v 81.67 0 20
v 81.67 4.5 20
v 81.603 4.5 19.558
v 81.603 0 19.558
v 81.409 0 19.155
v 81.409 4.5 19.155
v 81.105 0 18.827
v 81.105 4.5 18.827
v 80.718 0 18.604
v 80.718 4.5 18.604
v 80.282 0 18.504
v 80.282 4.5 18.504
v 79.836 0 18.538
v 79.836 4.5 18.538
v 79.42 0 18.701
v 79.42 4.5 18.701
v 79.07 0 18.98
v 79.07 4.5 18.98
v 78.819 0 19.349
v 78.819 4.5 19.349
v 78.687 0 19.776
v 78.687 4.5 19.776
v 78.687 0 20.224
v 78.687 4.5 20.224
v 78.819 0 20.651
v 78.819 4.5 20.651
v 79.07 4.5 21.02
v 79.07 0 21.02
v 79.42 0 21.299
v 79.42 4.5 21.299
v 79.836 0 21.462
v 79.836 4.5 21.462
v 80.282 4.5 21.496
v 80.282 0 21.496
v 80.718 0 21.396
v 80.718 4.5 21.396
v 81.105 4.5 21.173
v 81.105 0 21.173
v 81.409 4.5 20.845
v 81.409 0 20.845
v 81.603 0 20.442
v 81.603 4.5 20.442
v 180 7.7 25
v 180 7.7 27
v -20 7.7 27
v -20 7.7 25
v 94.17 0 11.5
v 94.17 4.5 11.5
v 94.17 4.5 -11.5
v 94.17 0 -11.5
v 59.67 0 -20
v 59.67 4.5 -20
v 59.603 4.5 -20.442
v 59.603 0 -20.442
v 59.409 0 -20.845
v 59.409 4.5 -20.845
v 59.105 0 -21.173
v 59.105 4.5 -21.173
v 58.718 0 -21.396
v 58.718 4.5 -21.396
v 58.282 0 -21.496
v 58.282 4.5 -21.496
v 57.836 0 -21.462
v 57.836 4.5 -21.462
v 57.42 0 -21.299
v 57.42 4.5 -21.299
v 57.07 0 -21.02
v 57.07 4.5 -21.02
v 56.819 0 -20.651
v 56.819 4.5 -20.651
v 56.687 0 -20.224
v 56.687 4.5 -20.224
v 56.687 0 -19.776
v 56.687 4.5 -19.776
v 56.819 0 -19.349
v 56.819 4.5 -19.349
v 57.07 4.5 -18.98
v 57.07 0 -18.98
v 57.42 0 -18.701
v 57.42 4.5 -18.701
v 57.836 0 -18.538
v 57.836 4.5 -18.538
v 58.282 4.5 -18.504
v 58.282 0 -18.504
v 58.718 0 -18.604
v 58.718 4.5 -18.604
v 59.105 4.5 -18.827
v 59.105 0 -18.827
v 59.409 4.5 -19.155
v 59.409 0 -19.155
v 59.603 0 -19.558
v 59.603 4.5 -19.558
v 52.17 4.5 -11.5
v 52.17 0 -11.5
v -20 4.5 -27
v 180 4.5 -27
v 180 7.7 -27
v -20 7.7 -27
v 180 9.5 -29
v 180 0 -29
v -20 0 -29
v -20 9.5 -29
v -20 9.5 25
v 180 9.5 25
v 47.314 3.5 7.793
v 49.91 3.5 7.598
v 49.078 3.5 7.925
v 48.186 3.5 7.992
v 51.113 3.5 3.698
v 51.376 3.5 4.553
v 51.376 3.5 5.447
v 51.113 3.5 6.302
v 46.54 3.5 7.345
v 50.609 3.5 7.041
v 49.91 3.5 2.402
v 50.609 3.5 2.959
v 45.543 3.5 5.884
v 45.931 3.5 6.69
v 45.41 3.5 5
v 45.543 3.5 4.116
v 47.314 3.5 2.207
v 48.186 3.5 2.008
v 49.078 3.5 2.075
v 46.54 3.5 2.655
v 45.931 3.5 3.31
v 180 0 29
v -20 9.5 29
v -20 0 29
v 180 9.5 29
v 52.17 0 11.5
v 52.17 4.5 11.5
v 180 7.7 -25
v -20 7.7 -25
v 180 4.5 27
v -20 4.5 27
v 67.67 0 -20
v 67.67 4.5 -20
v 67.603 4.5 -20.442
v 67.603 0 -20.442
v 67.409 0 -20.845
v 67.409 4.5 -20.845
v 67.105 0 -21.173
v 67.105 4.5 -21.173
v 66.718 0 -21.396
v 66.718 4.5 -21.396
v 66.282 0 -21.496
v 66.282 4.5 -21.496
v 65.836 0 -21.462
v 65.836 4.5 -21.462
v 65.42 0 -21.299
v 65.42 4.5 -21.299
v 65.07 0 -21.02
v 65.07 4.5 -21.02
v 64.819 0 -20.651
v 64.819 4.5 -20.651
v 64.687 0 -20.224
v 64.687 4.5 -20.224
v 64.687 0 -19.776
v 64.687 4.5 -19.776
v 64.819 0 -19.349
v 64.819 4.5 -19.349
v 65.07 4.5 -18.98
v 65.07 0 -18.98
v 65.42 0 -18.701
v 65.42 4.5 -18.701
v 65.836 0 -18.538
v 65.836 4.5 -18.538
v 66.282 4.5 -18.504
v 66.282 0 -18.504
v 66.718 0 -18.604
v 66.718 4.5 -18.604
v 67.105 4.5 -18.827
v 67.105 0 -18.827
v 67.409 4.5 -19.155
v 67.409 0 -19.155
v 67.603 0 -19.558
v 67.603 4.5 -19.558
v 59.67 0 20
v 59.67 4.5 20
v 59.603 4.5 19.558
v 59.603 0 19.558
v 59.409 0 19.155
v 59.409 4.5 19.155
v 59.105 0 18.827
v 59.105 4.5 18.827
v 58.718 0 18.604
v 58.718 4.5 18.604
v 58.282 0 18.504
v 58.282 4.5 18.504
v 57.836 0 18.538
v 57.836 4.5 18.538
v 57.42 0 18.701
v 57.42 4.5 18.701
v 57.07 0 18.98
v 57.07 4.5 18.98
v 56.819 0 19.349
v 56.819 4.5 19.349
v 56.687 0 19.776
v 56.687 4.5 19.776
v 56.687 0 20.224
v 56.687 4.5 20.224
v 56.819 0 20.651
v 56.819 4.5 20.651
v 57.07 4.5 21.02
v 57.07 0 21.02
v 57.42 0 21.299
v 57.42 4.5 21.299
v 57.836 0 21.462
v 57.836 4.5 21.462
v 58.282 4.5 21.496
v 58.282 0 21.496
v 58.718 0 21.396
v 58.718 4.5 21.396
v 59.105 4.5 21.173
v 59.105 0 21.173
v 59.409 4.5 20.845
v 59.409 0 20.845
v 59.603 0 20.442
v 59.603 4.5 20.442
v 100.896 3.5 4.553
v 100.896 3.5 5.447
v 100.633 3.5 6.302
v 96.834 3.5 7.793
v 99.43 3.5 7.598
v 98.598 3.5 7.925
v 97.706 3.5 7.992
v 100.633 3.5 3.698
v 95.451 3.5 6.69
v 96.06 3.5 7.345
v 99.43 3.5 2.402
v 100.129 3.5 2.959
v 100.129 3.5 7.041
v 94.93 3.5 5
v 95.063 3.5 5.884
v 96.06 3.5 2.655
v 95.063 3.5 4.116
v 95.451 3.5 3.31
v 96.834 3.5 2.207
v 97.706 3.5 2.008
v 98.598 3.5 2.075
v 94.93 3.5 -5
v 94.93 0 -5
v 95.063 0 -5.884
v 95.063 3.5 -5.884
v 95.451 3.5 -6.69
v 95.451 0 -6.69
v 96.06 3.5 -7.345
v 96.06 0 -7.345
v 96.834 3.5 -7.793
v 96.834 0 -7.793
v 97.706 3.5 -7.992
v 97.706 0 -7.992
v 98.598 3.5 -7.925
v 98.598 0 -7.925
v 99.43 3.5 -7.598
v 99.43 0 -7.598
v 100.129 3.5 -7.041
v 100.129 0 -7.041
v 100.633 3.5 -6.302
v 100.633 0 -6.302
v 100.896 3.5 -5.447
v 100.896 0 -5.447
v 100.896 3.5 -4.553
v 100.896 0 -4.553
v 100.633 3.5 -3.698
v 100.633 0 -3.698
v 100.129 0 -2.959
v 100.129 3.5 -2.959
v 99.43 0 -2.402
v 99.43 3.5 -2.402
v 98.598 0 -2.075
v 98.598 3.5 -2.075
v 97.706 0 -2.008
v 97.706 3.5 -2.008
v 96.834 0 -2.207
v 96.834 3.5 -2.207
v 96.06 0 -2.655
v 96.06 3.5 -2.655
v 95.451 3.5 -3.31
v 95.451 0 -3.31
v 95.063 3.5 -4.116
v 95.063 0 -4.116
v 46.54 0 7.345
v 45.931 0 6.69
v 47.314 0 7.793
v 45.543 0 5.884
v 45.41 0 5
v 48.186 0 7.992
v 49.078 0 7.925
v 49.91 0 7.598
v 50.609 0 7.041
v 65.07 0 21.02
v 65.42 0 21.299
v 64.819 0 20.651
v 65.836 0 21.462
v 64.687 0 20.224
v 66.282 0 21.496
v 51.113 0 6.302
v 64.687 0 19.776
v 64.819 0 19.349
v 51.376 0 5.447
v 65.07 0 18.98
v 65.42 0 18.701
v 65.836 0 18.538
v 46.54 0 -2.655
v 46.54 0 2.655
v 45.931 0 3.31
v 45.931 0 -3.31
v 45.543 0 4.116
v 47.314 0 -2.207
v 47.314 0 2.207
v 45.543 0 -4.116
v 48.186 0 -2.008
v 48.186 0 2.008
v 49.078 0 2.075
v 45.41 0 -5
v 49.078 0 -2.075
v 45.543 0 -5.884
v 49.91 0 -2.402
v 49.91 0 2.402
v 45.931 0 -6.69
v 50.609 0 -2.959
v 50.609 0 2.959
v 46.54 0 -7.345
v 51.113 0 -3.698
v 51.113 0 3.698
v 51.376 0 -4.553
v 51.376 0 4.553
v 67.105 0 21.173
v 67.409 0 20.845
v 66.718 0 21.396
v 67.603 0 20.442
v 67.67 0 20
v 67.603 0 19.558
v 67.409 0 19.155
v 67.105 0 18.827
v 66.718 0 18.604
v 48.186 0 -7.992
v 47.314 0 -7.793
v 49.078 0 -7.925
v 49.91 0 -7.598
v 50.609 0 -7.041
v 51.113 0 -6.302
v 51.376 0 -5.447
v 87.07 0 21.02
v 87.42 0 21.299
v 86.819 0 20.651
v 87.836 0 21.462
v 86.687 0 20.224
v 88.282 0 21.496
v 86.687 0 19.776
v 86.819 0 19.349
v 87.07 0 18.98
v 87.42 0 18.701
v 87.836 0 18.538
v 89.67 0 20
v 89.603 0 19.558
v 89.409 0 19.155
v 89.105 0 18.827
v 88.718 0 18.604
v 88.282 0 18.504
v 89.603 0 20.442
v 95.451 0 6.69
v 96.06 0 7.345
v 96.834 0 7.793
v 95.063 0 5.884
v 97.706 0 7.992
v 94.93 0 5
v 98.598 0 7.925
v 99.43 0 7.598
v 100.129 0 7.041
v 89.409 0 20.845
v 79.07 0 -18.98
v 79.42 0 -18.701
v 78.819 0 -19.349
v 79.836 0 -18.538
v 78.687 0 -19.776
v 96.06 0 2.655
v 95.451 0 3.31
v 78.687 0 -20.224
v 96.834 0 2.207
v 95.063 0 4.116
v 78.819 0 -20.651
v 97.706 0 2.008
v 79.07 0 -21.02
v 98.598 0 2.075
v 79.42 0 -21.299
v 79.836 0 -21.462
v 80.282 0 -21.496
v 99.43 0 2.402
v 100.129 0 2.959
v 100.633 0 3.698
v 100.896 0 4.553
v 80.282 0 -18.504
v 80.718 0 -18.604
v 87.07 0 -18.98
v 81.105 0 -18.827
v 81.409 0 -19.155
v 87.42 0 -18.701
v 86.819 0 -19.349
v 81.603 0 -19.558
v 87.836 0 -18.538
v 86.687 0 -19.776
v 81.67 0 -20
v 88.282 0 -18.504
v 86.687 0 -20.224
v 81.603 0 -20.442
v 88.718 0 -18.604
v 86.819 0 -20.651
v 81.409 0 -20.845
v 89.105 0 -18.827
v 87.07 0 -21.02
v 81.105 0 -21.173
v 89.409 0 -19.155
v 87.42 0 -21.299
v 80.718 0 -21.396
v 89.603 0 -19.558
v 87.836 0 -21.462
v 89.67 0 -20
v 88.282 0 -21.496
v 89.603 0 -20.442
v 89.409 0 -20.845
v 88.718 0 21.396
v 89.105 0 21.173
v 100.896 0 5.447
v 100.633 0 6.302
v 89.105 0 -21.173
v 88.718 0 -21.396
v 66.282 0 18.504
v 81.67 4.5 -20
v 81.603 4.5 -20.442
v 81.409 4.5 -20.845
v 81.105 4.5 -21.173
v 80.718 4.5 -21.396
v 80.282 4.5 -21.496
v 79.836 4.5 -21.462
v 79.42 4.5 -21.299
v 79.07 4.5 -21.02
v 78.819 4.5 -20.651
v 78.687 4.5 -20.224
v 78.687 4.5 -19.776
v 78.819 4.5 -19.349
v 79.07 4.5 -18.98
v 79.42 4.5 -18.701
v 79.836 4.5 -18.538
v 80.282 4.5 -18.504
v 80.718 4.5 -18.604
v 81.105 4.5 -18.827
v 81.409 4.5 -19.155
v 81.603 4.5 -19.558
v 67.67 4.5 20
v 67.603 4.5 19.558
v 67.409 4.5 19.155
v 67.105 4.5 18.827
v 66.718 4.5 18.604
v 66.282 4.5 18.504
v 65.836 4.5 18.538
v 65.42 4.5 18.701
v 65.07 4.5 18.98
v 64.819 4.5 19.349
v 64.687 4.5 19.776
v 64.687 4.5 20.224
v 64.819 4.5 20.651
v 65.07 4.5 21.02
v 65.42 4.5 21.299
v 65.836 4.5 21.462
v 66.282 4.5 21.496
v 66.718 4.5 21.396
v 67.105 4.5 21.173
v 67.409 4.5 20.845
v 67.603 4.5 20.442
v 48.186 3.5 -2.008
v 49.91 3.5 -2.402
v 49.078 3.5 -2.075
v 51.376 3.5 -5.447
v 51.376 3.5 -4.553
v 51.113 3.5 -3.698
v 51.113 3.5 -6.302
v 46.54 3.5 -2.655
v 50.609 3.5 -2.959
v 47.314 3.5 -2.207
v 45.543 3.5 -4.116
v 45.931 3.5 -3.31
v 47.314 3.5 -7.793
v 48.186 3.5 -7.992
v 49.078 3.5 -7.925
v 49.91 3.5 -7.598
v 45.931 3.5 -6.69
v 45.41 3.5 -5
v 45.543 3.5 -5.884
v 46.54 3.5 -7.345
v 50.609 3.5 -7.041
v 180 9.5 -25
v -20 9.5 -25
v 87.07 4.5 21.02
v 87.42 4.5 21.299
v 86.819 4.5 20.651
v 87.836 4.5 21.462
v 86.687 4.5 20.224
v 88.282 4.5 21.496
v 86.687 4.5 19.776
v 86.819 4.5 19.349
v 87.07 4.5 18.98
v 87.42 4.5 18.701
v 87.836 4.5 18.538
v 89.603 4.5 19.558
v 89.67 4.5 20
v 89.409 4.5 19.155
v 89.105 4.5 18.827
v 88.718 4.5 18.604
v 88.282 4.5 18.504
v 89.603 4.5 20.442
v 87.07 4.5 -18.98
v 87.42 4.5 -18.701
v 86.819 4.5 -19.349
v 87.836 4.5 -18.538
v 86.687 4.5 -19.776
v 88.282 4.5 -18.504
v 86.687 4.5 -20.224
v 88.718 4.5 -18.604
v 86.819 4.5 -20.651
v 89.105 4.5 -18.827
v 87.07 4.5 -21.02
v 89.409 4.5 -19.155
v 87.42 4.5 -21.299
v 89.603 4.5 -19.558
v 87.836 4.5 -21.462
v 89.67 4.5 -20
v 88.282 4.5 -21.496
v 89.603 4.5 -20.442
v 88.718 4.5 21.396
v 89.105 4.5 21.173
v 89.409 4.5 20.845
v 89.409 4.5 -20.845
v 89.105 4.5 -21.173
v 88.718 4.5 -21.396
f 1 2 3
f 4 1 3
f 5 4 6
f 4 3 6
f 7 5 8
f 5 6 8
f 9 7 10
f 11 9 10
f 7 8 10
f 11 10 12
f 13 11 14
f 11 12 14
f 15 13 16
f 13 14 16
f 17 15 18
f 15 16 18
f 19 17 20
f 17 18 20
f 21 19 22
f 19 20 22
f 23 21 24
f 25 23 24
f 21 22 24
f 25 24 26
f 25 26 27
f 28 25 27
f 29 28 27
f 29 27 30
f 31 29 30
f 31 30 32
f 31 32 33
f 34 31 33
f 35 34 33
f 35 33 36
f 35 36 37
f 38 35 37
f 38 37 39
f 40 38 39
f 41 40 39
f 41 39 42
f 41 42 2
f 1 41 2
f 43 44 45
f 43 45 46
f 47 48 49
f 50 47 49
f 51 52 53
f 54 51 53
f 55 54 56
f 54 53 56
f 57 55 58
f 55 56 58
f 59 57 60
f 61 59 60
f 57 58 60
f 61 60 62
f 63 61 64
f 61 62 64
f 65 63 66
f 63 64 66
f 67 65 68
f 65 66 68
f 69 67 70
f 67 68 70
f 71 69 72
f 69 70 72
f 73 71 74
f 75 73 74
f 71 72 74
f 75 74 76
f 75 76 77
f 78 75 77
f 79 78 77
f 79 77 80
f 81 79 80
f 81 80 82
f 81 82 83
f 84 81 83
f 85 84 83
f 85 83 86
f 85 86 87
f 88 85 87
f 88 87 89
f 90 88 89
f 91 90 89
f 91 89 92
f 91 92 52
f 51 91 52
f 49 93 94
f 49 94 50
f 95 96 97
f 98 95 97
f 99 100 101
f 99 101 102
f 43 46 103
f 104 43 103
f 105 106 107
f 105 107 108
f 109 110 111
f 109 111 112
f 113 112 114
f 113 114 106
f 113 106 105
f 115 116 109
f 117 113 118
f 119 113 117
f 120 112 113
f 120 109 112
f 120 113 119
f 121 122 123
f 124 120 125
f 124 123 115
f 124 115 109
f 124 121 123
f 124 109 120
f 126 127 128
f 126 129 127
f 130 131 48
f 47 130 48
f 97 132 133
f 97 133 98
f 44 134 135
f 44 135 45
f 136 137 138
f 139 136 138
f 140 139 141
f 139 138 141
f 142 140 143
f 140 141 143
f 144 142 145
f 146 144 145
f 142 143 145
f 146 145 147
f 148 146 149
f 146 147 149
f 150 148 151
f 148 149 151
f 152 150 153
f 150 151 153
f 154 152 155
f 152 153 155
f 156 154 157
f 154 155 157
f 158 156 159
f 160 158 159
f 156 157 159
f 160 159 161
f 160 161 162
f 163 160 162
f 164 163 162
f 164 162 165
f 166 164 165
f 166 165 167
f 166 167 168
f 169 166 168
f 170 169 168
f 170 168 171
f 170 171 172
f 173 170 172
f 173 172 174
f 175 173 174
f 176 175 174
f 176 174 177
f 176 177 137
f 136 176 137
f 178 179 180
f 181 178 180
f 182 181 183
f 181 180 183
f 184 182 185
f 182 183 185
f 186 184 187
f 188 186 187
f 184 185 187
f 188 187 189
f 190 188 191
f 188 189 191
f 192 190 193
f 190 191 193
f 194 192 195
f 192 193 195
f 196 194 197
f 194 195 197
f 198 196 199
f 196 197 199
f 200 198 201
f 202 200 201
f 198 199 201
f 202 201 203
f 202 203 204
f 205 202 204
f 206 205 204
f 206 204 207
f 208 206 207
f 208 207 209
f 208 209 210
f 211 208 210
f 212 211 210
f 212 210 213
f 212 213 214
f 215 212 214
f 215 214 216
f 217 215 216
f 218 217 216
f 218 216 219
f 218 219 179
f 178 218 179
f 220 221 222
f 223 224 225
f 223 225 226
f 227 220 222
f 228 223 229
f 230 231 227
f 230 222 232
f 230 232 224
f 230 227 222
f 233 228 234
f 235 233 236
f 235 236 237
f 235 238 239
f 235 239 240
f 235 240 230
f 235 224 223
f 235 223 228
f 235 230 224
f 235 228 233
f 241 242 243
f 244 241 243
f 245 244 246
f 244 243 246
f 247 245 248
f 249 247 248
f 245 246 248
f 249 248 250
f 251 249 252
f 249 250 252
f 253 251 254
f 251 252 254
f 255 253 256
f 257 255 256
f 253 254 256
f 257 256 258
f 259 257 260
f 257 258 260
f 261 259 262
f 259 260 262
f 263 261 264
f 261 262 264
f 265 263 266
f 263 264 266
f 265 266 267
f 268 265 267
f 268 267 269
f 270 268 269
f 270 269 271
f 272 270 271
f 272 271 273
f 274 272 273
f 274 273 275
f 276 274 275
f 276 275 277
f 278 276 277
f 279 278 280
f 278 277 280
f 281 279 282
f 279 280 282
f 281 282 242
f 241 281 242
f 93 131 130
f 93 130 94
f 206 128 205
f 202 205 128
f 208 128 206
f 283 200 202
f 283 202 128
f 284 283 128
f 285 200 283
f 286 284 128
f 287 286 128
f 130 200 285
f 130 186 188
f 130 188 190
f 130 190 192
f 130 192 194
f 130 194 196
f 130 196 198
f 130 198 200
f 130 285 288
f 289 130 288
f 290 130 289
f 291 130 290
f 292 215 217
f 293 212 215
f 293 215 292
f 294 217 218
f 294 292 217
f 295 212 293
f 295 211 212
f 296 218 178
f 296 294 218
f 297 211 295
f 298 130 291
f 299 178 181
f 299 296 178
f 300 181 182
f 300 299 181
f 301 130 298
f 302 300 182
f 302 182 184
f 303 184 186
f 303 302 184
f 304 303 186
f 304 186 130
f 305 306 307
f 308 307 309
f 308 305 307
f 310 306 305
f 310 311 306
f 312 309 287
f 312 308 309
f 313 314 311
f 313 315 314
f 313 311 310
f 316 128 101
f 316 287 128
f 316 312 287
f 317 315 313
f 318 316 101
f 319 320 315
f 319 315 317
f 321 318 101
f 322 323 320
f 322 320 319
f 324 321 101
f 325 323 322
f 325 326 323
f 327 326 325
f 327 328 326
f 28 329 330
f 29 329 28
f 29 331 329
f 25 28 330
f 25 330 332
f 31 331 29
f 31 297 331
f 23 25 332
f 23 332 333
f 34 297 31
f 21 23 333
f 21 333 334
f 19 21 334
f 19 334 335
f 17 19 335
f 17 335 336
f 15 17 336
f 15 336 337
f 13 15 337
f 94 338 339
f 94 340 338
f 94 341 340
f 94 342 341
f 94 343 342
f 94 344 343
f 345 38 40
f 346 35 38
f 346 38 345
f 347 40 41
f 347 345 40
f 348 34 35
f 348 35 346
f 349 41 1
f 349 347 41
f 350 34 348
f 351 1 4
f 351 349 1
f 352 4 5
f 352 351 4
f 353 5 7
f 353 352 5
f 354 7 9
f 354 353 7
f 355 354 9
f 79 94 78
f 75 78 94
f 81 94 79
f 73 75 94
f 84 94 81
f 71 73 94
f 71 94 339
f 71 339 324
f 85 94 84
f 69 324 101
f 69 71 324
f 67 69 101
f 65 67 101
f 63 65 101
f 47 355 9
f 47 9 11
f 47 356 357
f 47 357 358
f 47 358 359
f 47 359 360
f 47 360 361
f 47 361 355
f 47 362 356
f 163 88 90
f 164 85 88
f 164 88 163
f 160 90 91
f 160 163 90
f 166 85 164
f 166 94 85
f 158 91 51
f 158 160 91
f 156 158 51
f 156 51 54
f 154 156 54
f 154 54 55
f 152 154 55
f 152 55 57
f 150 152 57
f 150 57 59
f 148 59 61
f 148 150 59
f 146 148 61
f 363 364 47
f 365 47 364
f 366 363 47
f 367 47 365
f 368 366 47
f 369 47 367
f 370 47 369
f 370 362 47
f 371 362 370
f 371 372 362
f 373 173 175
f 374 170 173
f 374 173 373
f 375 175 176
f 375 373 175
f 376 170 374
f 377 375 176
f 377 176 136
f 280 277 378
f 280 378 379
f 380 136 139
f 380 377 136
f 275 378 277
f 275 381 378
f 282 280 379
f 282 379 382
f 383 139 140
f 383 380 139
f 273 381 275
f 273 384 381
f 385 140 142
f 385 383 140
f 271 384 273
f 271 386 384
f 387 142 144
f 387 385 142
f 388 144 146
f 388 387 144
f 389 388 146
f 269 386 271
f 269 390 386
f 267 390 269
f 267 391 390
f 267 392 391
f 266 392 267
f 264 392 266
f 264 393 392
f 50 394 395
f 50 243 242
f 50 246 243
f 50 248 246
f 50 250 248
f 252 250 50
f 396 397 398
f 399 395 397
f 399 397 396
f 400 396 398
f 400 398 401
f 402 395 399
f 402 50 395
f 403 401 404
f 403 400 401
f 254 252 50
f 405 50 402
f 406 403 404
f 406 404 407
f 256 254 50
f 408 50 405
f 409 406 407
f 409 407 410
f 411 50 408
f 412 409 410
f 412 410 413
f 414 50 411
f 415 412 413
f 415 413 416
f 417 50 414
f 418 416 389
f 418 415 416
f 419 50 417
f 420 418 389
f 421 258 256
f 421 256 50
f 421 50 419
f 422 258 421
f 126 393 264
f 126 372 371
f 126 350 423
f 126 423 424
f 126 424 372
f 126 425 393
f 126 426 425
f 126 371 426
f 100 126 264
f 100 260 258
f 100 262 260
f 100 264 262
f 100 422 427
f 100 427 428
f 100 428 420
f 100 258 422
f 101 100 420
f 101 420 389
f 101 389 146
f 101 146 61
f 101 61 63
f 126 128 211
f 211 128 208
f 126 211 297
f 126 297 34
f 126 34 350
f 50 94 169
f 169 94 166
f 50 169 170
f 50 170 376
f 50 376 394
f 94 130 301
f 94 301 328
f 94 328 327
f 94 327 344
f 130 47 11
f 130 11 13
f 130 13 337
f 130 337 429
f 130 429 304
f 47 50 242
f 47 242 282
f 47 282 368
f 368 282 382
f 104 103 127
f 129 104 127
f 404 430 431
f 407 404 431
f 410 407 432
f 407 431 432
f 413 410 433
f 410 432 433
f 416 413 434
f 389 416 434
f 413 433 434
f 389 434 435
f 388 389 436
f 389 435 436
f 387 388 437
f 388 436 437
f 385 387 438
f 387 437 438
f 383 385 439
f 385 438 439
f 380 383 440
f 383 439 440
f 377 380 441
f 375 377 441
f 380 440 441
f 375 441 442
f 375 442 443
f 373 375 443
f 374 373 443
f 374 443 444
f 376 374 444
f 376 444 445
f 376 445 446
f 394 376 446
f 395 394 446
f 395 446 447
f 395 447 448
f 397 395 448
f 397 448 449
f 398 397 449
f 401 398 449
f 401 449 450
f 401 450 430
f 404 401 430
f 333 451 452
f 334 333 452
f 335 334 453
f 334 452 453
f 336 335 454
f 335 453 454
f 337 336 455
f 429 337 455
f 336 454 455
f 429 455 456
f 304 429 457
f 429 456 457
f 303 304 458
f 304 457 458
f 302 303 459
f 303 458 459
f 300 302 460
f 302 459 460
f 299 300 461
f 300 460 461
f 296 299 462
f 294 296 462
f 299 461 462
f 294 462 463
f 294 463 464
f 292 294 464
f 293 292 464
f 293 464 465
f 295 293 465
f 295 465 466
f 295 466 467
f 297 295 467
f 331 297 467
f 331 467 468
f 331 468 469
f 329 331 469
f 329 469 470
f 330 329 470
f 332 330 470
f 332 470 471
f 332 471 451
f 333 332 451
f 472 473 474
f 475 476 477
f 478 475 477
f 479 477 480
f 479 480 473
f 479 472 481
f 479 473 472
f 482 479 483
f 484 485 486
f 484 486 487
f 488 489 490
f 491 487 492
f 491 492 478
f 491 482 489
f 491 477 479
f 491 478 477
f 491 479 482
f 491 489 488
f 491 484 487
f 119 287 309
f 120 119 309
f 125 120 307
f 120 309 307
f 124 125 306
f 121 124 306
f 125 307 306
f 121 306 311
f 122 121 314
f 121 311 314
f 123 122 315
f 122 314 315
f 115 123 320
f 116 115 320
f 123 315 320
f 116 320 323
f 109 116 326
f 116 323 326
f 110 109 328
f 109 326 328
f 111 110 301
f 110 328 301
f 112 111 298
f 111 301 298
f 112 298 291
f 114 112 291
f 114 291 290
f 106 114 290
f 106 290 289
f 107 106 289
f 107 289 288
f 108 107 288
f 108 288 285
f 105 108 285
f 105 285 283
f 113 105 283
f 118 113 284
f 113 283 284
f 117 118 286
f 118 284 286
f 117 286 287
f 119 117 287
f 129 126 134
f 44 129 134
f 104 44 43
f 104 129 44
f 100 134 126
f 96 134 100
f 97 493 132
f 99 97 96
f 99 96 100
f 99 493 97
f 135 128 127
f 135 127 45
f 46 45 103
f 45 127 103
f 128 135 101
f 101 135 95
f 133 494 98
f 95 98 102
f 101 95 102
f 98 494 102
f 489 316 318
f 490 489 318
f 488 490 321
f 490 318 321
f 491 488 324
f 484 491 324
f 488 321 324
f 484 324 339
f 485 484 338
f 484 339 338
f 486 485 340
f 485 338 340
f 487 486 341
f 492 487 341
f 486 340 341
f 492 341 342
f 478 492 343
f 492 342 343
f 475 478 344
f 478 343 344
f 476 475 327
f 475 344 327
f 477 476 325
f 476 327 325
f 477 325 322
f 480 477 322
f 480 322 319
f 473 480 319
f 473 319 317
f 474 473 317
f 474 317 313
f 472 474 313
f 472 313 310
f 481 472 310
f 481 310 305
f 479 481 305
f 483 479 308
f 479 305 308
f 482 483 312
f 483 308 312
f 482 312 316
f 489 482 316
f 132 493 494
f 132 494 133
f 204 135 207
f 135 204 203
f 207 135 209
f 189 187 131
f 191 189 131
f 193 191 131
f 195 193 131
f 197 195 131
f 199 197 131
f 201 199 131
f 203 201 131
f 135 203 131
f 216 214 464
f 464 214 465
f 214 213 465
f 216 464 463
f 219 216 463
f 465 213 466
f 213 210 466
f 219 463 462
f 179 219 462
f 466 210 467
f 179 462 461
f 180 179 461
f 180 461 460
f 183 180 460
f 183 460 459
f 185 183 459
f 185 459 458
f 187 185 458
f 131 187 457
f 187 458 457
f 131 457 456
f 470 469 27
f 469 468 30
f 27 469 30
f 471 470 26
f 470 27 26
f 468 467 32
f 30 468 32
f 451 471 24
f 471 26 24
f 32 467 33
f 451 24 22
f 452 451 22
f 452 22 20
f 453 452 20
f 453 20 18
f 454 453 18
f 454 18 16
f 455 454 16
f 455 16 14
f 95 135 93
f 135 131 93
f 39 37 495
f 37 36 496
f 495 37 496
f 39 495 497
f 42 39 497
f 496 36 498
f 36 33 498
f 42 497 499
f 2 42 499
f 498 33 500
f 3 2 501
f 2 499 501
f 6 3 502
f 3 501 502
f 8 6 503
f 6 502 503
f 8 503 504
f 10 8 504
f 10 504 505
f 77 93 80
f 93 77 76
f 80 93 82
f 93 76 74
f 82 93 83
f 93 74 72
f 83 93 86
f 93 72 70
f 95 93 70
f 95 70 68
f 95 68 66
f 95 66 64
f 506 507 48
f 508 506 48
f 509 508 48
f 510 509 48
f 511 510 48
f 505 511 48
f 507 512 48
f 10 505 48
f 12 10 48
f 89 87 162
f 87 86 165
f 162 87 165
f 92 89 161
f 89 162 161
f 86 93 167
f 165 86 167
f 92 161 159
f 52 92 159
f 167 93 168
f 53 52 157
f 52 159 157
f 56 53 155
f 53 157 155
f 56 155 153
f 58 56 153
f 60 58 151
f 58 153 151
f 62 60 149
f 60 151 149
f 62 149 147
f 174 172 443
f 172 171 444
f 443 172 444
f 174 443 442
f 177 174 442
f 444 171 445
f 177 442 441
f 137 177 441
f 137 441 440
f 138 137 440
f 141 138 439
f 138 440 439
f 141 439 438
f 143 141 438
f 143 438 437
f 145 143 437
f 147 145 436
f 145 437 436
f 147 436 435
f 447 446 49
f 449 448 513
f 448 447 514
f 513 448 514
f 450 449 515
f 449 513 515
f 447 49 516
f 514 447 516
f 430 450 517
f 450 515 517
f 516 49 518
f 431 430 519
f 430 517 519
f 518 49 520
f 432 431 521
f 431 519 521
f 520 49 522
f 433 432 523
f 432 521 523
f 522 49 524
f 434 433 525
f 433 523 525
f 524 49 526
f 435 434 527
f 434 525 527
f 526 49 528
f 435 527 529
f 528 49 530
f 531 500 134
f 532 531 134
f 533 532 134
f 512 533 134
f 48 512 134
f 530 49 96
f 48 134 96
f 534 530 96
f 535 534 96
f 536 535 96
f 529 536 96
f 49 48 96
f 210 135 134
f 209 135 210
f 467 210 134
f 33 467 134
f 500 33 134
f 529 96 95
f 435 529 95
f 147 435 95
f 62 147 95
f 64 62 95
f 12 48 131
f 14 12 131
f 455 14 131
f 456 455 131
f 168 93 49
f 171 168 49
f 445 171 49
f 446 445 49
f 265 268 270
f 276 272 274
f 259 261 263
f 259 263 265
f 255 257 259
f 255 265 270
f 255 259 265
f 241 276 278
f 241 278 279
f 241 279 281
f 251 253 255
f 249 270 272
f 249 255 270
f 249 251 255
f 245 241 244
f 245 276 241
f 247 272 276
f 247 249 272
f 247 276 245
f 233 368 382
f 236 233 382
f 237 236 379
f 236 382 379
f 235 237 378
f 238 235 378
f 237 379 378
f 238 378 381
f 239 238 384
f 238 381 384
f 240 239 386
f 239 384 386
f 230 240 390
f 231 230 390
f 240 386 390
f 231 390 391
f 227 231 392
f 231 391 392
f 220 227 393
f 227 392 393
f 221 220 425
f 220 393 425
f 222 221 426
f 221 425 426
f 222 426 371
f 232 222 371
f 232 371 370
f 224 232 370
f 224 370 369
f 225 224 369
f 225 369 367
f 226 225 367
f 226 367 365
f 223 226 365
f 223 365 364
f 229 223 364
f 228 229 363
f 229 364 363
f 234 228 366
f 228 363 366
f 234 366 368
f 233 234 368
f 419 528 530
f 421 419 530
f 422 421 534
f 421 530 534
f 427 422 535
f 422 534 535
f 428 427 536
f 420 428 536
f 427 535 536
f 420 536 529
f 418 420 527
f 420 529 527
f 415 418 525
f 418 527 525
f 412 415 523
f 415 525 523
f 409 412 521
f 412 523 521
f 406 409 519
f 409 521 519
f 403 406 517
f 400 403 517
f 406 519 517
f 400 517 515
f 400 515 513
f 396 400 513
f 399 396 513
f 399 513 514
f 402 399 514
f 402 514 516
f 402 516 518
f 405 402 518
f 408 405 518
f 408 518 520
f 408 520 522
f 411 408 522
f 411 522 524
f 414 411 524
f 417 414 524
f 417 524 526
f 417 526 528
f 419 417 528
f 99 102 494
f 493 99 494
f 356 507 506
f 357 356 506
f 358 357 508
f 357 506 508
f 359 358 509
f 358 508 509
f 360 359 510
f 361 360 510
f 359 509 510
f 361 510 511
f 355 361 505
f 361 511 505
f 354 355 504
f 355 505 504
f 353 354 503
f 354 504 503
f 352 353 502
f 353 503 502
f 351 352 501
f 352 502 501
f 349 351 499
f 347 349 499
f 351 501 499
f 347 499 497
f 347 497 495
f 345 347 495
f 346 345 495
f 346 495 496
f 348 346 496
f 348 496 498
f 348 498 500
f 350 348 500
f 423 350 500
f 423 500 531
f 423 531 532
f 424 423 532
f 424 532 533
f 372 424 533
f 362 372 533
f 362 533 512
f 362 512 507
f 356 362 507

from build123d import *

# Parameters (mm, degrees)
EXTRUDE_1_DEPTH      = 180
EXTRUDE_1_DEPTH_BACK = 20
SKETCH_2_W           = 42
SKETCH_2_H           = 23
CUT_EXTRUDE_1_DEPTH  = 5.5
SKETCH_4_R           = 1.5
CUT_EXTRUDE_2_DEPTH  = 5.5
SKETCH_5_W           = 2
SKETCH_5_H           = 2.2
CUT_EXTRUDE_3_DEPTH  = 225
SKETCH_6_R           = 3
CUT_EXTRUDE_4_DEPTH  = 3.5
SKETCH_7_W           = 2
SKETCH_7_H           = 1
CUT_EXTRUDE_5_DEPTH  = 200


with BuildPart() as part:
    # 草图1 → 凸台-拉伸1 (new body, two sides)
    with BuildSketch(Plane(origin=(0, 0, 0), x_dir=(0, 0, -1), z_dir=(1, 0, 0))) as extrude_1_sk:
        Polygon((-29, 0), (29, 0), (29, 9.5), (25, 9.5), (25, 4.5), (-25, 4.5), (-25, 9.5), (-29, 9.5), align=None)
    extrude(amount=EXTRUDE_1_DEPTH)
    extrude(extrude_1_sk.sketch, amount=-EXTRUDE_1_DEPTH_BACK)

    # 草图2 → 切除-拉伸1 (cut, through all)
    with BuildSketch(Plane(origin=(0, 4.5, 0), x_dir=(1, 0, 0), z_dir=(0, 1, 0))):
        with Locations((73.17, 0)):
            Rectangle(SKETCH_2_W, SKETCH_2_H)
    extrude(amount=-CUT_EXTRUDE_1_DEPTH, mode=Mode.SUBTRACT)

    # 草图4 → 切除-拉伸2 (cut, through all)
    with BuildSketch(Plane(origin=(0, 4.5, 0), x_dir=(1, 0, 0), z_dir=(0, 1, 0))):
        with Locations((66.17, 20)):
            Circle(SKETCH_4_R)
        with Locations((80.17, 20)):
            Circle(SKETCH_4_R)
        with Locations((88.17, 20)):
            Circle(SKETCH_4_R)
        with Locations((58.17, 20)):
            Circle(SKETCH_4_R)
        with Locations((88.17, -20)):
            Circle(SKETCH_4_R)
        with Locations((80.17, -20)):
            Circle(SKETCH_4_R)
        with Locations((66.17, -20)):
            Circle(SKETCH_4_R)
        with Locations((58.17, -20)):
            Circle(SKETCH_4_R)
    extrude(amount=-CUT_EXTRUDE_2_DEPTH, mode=Mode.SUBTRACT)

    # 草图5 → 切除-拉伸3 (cut)
    with BuildSketch(Plane(origin=(180, 0, 0), x_dir=(0, 0, -1), z_dir=(1, 0, 0))):
        with Locations((-26, 6.6)):
            Rectangle(SKETCH_5_W, SKETCH_5_H)
        with Locations((26, 6.6)):
            Rectangle(SKETCH_5_W, SKETCH_5_H)
    extrude(amount=-CUT_EXTRUDE_3_DEPTH, mode=Mode.SUBTRACT)

    # 草图6 → 切除-拉伸4 (cut)
    with BuildSketch(Plane(origin=(0, 0, 0), x_dir=(-1, 0, 0), z_dir=(0, -1, 0))):
        with Locations((-97.93, 5)):
            Circle(SKETCH_6_R)
        with Locations((-48.41, 5)):
            Circle(SKETCH_6_R)
        with Locations((-48.41, -5)):
            Circle(SKETCH_6_R)
        with Locations((-97.93, -5)):
            Circle(SKETCH_6_R)
    extrude(amount=-CUT_EXTRUDE_4_DEPTH, mode=Mode.SUBTRACT)

    # 草图7 → 切除-拉伸5 (cut)
    with BuildSketch(Plane(origin=(180, 0, 0), x_dir=(0, 0, -1), z_dir=(1, 0, 0))):
        with Locations((-26, 5)):
            Rectangle(SKETCH_7_W, SKETCH_7_H)
        with Locations((26, 5)):
            Rectangle(SKETCH_7_W, SKETCH_7_H)
    extrude(amount=-CUT_EXTRUDE_5_DEPTH, mode=Mode.SUBTRACT)


solid = part.part
